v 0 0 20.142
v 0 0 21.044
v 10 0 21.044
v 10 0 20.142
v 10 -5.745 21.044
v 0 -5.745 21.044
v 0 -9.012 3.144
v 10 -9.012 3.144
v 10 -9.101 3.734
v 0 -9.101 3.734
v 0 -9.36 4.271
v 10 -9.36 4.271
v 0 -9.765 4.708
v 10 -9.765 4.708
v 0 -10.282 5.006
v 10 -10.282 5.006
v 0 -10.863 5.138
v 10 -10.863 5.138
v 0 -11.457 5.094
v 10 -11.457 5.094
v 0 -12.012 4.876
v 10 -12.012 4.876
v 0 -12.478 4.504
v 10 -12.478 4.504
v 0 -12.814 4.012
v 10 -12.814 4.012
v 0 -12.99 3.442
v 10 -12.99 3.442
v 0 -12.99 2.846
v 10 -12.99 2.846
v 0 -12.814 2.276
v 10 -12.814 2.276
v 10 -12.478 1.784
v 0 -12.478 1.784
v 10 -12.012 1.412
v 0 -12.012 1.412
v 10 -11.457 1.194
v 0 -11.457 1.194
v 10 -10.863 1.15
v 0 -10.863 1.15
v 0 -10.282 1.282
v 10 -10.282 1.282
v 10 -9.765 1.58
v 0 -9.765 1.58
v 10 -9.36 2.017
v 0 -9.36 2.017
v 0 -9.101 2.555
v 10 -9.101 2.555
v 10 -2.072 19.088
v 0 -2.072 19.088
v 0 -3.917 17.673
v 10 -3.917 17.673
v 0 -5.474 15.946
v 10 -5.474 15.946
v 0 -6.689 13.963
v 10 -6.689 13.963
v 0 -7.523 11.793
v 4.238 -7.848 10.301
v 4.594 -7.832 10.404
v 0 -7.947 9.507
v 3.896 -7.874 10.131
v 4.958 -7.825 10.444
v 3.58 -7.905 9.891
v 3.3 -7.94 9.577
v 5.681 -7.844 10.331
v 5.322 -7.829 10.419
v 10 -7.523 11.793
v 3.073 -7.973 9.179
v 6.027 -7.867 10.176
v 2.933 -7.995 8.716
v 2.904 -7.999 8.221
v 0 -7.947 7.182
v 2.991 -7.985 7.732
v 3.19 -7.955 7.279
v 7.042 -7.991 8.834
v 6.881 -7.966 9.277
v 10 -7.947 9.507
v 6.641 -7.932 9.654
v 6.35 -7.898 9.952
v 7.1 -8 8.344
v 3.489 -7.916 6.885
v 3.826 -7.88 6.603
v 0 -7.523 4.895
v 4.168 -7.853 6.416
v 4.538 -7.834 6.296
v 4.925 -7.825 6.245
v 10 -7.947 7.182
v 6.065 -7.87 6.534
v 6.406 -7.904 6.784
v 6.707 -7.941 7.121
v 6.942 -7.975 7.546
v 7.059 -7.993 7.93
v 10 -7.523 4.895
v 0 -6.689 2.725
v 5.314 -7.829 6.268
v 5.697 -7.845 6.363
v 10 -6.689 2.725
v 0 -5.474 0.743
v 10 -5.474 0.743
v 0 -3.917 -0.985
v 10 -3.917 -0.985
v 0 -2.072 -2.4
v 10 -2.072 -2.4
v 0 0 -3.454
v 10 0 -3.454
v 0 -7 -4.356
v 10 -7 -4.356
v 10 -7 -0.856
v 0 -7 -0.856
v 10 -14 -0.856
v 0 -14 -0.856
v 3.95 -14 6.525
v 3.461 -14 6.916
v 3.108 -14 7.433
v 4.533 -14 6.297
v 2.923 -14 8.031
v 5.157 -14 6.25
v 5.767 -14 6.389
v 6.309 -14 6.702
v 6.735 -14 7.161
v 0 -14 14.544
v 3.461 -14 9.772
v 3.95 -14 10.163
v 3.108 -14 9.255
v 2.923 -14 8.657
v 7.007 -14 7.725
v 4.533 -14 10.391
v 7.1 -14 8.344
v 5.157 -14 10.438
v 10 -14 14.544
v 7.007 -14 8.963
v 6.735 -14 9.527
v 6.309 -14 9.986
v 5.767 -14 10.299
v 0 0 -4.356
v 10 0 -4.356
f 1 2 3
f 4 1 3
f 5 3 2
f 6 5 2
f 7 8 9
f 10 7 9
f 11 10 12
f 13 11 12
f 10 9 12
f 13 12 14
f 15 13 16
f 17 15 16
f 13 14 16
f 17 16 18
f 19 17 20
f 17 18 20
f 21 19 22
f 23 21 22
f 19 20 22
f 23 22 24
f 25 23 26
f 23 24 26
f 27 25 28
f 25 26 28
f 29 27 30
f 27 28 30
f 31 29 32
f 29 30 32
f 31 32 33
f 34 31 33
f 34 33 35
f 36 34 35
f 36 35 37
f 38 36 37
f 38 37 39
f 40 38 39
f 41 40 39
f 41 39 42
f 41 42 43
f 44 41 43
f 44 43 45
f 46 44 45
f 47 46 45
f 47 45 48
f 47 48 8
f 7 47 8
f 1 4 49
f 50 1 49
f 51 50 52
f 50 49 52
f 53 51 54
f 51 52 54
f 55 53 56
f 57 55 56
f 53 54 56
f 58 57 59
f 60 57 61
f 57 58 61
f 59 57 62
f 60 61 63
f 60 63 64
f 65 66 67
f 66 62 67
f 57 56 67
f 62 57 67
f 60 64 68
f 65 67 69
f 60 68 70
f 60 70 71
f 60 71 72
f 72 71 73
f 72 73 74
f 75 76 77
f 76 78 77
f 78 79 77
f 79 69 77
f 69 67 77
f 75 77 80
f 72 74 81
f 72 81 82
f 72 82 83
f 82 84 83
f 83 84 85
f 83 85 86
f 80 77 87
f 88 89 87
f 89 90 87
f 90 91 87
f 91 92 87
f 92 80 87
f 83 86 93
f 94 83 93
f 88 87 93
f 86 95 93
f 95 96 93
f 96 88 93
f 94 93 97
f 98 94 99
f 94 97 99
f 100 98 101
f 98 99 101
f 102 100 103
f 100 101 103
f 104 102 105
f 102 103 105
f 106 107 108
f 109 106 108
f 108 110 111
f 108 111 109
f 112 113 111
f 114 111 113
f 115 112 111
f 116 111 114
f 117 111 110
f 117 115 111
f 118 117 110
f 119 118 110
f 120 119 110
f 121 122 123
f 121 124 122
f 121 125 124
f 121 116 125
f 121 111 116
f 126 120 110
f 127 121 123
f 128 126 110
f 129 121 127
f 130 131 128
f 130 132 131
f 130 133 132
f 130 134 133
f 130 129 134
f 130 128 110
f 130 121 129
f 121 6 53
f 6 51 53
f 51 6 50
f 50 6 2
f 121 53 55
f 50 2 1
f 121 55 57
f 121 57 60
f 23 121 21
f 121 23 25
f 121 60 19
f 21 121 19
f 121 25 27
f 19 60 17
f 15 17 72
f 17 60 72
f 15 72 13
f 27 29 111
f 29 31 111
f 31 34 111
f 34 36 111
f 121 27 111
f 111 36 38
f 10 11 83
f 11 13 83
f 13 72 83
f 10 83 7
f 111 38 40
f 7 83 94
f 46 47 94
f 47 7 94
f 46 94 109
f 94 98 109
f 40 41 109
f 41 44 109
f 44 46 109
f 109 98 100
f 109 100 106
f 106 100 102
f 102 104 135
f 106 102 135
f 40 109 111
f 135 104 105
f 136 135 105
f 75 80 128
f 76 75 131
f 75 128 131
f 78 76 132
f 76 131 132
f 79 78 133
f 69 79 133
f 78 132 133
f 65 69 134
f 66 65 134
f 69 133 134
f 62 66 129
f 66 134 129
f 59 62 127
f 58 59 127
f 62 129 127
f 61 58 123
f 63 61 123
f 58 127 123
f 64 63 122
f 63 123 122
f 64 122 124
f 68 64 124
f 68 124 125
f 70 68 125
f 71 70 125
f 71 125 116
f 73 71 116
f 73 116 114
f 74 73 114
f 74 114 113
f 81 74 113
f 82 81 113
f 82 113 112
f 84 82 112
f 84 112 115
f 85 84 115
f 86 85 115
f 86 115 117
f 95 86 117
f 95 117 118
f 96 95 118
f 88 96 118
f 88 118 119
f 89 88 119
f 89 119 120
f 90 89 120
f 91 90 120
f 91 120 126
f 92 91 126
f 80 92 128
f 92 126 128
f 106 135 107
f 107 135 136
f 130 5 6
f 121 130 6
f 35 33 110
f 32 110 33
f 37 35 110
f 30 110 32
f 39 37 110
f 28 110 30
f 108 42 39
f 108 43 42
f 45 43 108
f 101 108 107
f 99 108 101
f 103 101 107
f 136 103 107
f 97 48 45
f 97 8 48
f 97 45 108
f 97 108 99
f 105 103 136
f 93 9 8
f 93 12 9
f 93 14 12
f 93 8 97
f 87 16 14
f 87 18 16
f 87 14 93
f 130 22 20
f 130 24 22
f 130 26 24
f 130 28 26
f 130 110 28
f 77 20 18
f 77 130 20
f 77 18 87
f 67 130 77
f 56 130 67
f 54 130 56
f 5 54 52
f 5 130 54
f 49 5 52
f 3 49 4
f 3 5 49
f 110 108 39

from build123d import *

# Parameters (mm, degrees)
F1_DEPTH = 14
F3_DEPTH = 11
F4_R     = 2.1
F5_DEPTH = 14.001
F6_SIZE2 = 6.5
F6_SIZE  = 8.255
F7_DEPTH = 25.4
F2_W     = 7
F2_H     = 3.5
F8_DEPTH = 10.0010001
F2_R     = 2
F9_DEPTH = 25


# Not quite as in the source:
# - a feature names something its author has since deleted; it is built from what else it names


with BuildPart() as f1:
    # F0 (on Front) → F1 (new body)
    with BuildSketch(Plane.XZ):
        Polygon((10, 21.0440813839), (0, 21.0440813839), (0, 0), (0, -4.3559186161), (10, -4.3559186161), (10, 0), align=None)
    extrude(amount=F1_DEPTH)

    # F2 (on face) → F3 (join)
    with BuildSketch(Plane.YZ.offset(10)):
        with BuildLine():
            Line((0, -3.4542235791), (0, 20.1423863469))
            ThreePointArc((0, 20.1423863469), (-8, 8.3440813839), (0, -3.4542235791))
        make_face()
    extrude(amount=-F3_DEPTH)

    # F4 (on face) → F5 (cut, through all)
    with BuildSketch(Plane.XZ.offset(14)):
        with Locations((5, 8.3440813839)):
            Circle(F4_R)
    extrude(amount=-F5_DEPTH, mode=Mode.SUBTRACT)

    # F6
    f6_edges = [f1.edges().sort_by_distance(p)[0] for p in [
        (5, -14, 21.044081),
    ]]
    f6_side = f1.faces().sort_by_distance((5, -7, 21.044081))[0]
    chamfer(f6_edges, length=F6_SIZE, length2=F6_SIZE2, reference=f6_side)

    # F2 (on face) → F7 (cut)
    with BuildSketch(Plane.YZ.offset(10)):
        with BuildLine():
            Line((0, -3.4542235791), (0, 20.1423863469))
            ThreePointArc((0, 20.1423863469), (-8, 8.3440813839), (0, -3.4542235791))
        make_face()
    extrude(amount=-F7_DEPTH, mode=Mode.SUBTRACT)

    # F2 (on face) → F8 (cut, through all)
    with BuildSketch(Plane.YZ.offset(10)):
        with Locations((-10.5, -2.6059186161)):
            Rectangle(F2_W, F2_H)
    extrude(amount=-F8_DEPTH, mode=Mode.SUBTRACT)

    # F2 (on face) → F9 (cut)
    with BuildSketch(Plane.YZ.offset(10)):
        with BuildLine():
            Line((4.7, 21.0440813839), (1.525, 21.0440813839))
            Line((1.525, 21.0440813839), (1.525, 20.6408035082))
            ThreePointArc((1.525, 20.6408035082), (3.0997454855, 20.9428585265), (4.7, 21.0440813839))
        make_face()
        with BuildLine():
            Line((7.875, 21.0440813839), (4.7, 21.0440813839))
            ThreePointArc((4.7, 21.0440813839), (3.0997454855, 20.9428585265), (1.525, 20.6408035082))
            Line((1.525, 20.6408035082), (1.525, -3.9526407403))
            ThreePointArc((1.525, -3.9526407403), (3.0997454855, -4.2546957586), (4.7, -4.3559186161))
            Line((4.7, -4.3559186161), (7.875, -4.3559186161))
            Line((7.875, -4.3559186161), (7.875, 21.0440813839))
        make_face()
        with BuildLine():
            Line((1.525, -3.9526407403), (1.525, 20.6408035082))
            ThreePointArc((1.525, 20.6408035082), (0.7546215433, 20.4157005311), (0, 20.1423863469))
            Line((0, 20.1423863469), (0, -3.4542235791))
            ThreePointArc((0, -3.4542235791), (0.7546215433, -3.7275377632), (1.525, -3.9526407403))
        make_face()
        with BuildLine():
            ThreePointArc((4.7, -4.3559186161), (3.0997454855, -4.2546957586), (1.525, -3.9526407403))
            Line((1.525, -3.9526407403), (1.525, -4.3559186161))
            Line((1.525, -4.3559186161), (2.607938957, -4.3559186161))
            Line((2.607938957, -4.3559186161), (4.7, -4.3559186161))
        make_face()
        with BuildLine():
            Line((0, -3.4542235791), (0, 20.1423863469))
            ThreePointArc((0, 20.1423863469), (-8, 8.3440813839), (0, -3.4542235791))
        make_face()
        with Locations((-11.0123908797, 3.1440813839)):
            Circle(F2_R)
    extrude(amount=-F9_DEPTH, mode=Mode.SUBTRACT)


solid = f1.part
